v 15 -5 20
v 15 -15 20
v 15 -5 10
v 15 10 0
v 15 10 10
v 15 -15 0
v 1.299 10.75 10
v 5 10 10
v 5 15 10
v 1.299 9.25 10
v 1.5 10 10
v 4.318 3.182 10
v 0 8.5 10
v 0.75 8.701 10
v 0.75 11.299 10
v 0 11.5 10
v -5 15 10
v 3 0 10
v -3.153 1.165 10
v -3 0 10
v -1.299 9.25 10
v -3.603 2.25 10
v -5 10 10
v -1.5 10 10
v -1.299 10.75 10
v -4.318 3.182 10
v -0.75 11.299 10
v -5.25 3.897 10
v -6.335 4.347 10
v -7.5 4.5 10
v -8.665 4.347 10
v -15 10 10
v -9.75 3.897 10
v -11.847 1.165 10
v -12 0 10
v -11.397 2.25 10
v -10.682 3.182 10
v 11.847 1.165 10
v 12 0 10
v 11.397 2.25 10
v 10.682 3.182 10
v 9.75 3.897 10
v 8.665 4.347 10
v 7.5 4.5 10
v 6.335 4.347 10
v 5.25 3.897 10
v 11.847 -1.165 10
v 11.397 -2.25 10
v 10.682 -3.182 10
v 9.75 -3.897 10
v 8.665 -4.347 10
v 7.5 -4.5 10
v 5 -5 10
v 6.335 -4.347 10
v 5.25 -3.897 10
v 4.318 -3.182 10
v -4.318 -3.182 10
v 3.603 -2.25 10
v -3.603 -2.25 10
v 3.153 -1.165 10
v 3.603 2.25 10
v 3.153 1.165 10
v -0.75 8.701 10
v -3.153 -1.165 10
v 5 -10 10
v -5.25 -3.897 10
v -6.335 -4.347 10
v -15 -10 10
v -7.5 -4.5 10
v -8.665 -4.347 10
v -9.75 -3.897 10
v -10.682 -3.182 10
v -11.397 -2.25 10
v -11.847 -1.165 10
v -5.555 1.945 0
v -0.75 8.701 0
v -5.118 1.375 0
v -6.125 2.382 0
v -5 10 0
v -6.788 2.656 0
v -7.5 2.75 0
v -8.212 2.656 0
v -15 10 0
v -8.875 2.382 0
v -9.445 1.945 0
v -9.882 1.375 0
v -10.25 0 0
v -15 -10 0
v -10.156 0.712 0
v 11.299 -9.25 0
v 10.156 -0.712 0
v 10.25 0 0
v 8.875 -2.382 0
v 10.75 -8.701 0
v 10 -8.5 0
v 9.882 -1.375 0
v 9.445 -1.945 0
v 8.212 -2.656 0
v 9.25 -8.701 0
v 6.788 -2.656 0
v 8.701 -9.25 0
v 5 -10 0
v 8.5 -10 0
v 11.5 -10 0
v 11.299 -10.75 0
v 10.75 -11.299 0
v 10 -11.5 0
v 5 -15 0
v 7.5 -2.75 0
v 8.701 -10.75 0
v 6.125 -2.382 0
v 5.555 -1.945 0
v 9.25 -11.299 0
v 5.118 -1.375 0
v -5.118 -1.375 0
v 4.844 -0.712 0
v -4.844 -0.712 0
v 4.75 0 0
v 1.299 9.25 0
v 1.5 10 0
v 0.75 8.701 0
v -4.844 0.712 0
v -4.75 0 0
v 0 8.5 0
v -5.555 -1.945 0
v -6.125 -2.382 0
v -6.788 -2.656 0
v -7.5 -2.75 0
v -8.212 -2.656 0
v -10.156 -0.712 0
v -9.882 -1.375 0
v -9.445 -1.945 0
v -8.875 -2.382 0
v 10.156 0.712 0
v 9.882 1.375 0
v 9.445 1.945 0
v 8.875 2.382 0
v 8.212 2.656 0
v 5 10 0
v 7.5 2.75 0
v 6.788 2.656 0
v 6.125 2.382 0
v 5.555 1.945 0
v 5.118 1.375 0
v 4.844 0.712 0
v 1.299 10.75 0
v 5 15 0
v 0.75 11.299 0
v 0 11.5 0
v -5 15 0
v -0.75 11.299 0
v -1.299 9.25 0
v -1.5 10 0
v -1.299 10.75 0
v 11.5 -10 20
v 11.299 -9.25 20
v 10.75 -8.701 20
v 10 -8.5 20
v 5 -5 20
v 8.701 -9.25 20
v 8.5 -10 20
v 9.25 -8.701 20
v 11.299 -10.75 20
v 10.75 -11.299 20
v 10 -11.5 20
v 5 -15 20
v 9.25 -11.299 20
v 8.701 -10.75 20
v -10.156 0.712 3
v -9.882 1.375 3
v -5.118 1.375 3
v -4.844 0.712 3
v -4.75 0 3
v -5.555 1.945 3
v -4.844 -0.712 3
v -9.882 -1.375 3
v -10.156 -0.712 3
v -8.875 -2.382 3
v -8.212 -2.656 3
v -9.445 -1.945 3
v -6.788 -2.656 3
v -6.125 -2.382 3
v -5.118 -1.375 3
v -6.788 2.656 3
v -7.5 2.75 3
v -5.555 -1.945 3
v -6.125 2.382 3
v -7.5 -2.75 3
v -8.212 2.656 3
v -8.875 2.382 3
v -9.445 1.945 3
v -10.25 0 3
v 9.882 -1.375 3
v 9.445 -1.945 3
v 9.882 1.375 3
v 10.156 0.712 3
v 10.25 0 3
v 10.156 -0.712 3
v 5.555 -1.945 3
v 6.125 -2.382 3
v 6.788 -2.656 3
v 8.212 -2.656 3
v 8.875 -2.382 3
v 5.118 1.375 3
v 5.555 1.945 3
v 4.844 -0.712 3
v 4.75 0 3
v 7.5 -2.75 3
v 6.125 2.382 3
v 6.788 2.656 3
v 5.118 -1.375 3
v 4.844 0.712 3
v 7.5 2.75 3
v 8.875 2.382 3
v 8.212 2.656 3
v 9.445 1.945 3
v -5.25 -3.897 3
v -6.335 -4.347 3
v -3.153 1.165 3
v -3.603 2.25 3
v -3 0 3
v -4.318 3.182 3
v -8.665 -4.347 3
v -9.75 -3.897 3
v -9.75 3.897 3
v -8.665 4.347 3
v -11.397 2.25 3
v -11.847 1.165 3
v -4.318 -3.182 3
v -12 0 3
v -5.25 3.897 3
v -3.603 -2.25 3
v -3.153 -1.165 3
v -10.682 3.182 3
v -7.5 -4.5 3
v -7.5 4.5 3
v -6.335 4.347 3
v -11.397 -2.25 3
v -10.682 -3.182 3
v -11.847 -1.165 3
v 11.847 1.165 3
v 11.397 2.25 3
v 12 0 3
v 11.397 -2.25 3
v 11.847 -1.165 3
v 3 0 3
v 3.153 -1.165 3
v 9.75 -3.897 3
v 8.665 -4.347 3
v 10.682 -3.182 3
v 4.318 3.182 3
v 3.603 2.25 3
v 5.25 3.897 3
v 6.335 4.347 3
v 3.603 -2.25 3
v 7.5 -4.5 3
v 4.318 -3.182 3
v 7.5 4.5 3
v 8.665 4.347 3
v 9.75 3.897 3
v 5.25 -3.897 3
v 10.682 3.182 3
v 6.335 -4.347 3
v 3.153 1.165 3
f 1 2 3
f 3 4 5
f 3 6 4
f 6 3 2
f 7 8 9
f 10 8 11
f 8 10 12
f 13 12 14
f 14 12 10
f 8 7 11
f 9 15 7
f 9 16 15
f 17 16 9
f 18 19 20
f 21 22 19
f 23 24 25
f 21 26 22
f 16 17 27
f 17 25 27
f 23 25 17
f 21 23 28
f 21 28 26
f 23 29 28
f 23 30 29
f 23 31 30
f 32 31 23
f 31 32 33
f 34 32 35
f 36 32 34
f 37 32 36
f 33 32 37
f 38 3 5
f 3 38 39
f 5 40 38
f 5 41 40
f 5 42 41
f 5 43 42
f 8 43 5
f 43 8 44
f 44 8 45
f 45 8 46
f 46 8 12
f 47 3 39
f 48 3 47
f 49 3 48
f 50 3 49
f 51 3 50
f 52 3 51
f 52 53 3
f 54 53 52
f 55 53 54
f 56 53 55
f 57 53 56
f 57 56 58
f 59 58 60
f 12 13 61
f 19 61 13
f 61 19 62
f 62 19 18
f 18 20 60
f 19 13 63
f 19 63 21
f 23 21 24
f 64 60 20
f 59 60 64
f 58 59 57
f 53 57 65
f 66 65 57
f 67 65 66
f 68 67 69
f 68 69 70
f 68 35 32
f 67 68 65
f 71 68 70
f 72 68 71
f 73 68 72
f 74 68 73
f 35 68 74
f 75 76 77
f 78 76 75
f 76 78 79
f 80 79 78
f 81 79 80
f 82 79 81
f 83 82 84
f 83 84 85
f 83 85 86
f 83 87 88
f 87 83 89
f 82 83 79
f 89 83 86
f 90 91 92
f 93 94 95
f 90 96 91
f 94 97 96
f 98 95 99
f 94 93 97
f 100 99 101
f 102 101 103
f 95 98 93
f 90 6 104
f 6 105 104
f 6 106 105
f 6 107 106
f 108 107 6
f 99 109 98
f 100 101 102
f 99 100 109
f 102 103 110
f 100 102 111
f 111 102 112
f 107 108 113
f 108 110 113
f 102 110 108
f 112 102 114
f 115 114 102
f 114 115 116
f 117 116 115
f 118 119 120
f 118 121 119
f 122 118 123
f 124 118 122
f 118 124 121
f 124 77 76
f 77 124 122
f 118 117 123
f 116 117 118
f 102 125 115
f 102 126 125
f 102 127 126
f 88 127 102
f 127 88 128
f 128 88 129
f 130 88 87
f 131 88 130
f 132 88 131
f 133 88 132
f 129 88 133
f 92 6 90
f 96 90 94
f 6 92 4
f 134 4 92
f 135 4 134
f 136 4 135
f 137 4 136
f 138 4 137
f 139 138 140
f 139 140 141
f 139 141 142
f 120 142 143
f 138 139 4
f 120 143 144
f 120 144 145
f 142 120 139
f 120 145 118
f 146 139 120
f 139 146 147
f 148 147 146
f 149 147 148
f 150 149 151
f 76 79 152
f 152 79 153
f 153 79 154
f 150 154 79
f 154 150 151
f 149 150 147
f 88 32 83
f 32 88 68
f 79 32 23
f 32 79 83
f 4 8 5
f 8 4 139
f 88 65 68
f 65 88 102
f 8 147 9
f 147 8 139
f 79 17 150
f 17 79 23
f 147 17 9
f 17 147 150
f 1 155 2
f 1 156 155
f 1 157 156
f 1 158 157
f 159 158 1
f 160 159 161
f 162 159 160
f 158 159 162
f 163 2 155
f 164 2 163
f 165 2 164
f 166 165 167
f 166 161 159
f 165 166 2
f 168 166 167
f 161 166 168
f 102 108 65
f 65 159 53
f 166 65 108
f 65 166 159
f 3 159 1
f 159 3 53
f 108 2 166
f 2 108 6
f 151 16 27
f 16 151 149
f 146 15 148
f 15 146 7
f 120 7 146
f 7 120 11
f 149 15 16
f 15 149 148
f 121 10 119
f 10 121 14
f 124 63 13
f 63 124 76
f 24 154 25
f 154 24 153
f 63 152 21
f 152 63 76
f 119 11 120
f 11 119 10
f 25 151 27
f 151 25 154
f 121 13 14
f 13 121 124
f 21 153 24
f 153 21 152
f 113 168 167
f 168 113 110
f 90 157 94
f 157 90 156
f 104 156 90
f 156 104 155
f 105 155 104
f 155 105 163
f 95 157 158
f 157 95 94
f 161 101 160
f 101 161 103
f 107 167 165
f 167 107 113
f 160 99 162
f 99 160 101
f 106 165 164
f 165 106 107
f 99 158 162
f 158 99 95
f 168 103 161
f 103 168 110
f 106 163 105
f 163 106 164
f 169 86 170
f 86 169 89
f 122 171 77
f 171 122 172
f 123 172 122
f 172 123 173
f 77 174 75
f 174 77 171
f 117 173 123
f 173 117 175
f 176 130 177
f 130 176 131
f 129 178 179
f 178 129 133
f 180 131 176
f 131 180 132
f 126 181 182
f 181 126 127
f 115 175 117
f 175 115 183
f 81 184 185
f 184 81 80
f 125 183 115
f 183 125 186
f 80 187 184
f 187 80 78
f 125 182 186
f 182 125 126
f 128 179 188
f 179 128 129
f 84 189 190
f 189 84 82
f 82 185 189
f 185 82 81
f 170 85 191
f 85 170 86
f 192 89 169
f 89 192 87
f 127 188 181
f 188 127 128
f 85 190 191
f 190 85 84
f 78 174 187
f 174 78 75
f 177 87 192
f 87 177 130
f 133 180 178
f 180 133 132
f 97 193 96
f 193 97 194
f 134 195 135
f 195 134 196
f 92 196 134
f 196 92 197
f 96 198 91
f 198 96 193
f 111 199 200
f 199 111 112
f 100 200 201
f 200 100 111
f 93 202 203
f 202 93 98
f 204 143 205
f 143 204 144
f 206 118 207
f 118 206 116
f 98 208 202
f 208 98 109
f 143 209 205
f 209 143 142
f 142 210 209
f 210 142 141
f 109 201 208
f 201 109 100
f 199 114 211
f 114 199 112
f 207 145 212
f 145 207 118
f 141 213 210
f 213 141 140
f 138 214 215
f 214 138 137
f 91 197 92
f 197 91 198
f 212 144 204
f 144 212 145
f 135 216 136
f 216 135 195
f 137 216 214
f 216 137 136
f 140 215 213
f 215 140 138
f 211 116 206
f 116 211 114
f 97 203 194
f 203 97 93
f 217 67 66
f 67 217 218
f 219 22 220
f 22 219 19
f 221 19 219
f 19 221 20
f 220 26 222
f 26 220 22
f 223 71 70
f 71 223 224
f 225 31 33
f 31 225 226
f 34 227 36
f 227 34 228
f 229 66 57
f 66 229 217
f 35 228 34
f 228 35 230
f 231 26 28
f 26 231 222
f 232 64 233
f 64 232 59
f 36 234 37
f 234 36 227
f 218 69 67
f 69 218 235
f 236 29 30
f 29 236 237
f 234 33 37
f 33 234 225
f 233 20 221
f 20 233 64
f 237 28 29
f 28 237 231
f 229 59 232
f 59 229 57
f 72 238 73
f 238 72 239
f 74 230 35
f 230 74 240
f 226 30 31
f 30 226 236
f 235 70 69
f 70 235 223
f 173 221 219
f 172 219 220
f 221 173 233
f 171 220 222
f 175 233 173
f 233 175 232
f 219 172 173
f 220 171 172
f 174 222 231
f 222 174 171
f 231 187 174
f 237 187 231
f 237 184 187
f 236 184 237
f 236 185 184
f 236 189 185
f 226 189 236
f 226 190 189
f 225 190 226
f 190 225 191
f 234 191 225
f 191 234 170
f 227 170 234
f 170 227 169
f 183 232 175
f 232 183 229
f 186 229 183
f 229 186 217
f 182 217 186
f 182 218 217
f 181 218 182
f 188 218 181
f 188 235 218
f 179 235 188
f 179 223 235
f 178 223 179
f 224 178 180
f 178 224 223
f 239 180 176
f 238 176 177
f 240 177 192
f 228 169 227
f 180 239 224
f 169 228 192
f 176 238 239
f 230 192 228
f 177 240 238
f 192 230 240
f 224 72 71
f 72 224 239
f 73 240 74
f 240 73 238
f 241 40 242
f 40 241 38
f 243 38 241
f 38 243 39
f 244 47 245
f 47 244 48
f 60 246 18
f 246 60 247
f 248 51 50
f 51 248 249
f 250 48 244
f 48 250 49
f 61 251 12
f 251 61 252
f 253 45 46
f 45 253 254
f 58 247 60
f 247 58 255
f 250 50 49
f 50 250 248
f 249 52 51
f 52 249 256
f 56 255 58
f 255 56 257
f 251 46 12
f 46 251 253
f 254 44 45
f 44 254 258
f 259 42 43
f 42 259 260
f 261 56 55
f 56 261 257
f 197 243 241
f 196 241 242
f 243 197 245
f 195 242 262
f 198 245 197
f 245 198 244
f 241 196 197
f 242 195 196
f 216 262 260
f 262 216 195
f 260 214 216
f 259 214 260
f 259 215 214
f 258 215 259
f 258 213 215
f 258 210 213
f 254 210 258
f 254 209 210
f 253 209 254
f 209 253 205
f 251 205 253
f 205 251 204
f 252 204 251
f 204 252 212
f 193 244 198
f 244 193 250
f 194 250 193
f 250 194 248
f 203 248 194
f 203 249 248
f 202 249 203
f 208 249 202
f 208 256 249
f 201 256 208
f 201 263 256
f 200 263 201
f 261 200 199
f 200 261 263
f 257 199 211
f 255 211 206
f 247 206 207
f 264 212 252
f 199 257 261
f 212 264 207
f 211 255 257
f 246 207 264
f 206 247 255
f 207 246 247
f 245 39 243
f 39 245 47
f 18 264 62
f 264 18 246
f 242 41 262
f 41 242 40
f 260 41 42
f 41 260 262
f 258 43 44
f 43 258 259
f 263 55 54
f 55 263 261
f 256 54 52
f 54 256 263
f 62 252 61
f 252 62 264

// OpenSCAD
difference()
{
    
    union()
    {
        translate([-15,-10,0])
            cube([30,20,10]);
        
        translate([-5,5,0])
            cube([10,10,10]);
        
        translate([5,-15,0])
            cube([10,10,20]);
    }
    
    union()
    {
        translate([0,10,0])
            cylinder(d=3,h=20,$fn=12);
        translate([10,-10,0])
            cylinder(d=3,h=20,$fn=12);
        
        translate([-7.5,0,0])
            cylinder(d=5.5,h=20,$fn=24);
        translate([7.5,0,0])
            cylinder(d=5.5,h=20,$fn=24);
        
        translate([-7.5,0,3])
            cylinder(d=9,h=20,$fn=24);
        translate([7.5,0,3])
            cylinder(d=9,h=20,$fn=24);
    }
}
